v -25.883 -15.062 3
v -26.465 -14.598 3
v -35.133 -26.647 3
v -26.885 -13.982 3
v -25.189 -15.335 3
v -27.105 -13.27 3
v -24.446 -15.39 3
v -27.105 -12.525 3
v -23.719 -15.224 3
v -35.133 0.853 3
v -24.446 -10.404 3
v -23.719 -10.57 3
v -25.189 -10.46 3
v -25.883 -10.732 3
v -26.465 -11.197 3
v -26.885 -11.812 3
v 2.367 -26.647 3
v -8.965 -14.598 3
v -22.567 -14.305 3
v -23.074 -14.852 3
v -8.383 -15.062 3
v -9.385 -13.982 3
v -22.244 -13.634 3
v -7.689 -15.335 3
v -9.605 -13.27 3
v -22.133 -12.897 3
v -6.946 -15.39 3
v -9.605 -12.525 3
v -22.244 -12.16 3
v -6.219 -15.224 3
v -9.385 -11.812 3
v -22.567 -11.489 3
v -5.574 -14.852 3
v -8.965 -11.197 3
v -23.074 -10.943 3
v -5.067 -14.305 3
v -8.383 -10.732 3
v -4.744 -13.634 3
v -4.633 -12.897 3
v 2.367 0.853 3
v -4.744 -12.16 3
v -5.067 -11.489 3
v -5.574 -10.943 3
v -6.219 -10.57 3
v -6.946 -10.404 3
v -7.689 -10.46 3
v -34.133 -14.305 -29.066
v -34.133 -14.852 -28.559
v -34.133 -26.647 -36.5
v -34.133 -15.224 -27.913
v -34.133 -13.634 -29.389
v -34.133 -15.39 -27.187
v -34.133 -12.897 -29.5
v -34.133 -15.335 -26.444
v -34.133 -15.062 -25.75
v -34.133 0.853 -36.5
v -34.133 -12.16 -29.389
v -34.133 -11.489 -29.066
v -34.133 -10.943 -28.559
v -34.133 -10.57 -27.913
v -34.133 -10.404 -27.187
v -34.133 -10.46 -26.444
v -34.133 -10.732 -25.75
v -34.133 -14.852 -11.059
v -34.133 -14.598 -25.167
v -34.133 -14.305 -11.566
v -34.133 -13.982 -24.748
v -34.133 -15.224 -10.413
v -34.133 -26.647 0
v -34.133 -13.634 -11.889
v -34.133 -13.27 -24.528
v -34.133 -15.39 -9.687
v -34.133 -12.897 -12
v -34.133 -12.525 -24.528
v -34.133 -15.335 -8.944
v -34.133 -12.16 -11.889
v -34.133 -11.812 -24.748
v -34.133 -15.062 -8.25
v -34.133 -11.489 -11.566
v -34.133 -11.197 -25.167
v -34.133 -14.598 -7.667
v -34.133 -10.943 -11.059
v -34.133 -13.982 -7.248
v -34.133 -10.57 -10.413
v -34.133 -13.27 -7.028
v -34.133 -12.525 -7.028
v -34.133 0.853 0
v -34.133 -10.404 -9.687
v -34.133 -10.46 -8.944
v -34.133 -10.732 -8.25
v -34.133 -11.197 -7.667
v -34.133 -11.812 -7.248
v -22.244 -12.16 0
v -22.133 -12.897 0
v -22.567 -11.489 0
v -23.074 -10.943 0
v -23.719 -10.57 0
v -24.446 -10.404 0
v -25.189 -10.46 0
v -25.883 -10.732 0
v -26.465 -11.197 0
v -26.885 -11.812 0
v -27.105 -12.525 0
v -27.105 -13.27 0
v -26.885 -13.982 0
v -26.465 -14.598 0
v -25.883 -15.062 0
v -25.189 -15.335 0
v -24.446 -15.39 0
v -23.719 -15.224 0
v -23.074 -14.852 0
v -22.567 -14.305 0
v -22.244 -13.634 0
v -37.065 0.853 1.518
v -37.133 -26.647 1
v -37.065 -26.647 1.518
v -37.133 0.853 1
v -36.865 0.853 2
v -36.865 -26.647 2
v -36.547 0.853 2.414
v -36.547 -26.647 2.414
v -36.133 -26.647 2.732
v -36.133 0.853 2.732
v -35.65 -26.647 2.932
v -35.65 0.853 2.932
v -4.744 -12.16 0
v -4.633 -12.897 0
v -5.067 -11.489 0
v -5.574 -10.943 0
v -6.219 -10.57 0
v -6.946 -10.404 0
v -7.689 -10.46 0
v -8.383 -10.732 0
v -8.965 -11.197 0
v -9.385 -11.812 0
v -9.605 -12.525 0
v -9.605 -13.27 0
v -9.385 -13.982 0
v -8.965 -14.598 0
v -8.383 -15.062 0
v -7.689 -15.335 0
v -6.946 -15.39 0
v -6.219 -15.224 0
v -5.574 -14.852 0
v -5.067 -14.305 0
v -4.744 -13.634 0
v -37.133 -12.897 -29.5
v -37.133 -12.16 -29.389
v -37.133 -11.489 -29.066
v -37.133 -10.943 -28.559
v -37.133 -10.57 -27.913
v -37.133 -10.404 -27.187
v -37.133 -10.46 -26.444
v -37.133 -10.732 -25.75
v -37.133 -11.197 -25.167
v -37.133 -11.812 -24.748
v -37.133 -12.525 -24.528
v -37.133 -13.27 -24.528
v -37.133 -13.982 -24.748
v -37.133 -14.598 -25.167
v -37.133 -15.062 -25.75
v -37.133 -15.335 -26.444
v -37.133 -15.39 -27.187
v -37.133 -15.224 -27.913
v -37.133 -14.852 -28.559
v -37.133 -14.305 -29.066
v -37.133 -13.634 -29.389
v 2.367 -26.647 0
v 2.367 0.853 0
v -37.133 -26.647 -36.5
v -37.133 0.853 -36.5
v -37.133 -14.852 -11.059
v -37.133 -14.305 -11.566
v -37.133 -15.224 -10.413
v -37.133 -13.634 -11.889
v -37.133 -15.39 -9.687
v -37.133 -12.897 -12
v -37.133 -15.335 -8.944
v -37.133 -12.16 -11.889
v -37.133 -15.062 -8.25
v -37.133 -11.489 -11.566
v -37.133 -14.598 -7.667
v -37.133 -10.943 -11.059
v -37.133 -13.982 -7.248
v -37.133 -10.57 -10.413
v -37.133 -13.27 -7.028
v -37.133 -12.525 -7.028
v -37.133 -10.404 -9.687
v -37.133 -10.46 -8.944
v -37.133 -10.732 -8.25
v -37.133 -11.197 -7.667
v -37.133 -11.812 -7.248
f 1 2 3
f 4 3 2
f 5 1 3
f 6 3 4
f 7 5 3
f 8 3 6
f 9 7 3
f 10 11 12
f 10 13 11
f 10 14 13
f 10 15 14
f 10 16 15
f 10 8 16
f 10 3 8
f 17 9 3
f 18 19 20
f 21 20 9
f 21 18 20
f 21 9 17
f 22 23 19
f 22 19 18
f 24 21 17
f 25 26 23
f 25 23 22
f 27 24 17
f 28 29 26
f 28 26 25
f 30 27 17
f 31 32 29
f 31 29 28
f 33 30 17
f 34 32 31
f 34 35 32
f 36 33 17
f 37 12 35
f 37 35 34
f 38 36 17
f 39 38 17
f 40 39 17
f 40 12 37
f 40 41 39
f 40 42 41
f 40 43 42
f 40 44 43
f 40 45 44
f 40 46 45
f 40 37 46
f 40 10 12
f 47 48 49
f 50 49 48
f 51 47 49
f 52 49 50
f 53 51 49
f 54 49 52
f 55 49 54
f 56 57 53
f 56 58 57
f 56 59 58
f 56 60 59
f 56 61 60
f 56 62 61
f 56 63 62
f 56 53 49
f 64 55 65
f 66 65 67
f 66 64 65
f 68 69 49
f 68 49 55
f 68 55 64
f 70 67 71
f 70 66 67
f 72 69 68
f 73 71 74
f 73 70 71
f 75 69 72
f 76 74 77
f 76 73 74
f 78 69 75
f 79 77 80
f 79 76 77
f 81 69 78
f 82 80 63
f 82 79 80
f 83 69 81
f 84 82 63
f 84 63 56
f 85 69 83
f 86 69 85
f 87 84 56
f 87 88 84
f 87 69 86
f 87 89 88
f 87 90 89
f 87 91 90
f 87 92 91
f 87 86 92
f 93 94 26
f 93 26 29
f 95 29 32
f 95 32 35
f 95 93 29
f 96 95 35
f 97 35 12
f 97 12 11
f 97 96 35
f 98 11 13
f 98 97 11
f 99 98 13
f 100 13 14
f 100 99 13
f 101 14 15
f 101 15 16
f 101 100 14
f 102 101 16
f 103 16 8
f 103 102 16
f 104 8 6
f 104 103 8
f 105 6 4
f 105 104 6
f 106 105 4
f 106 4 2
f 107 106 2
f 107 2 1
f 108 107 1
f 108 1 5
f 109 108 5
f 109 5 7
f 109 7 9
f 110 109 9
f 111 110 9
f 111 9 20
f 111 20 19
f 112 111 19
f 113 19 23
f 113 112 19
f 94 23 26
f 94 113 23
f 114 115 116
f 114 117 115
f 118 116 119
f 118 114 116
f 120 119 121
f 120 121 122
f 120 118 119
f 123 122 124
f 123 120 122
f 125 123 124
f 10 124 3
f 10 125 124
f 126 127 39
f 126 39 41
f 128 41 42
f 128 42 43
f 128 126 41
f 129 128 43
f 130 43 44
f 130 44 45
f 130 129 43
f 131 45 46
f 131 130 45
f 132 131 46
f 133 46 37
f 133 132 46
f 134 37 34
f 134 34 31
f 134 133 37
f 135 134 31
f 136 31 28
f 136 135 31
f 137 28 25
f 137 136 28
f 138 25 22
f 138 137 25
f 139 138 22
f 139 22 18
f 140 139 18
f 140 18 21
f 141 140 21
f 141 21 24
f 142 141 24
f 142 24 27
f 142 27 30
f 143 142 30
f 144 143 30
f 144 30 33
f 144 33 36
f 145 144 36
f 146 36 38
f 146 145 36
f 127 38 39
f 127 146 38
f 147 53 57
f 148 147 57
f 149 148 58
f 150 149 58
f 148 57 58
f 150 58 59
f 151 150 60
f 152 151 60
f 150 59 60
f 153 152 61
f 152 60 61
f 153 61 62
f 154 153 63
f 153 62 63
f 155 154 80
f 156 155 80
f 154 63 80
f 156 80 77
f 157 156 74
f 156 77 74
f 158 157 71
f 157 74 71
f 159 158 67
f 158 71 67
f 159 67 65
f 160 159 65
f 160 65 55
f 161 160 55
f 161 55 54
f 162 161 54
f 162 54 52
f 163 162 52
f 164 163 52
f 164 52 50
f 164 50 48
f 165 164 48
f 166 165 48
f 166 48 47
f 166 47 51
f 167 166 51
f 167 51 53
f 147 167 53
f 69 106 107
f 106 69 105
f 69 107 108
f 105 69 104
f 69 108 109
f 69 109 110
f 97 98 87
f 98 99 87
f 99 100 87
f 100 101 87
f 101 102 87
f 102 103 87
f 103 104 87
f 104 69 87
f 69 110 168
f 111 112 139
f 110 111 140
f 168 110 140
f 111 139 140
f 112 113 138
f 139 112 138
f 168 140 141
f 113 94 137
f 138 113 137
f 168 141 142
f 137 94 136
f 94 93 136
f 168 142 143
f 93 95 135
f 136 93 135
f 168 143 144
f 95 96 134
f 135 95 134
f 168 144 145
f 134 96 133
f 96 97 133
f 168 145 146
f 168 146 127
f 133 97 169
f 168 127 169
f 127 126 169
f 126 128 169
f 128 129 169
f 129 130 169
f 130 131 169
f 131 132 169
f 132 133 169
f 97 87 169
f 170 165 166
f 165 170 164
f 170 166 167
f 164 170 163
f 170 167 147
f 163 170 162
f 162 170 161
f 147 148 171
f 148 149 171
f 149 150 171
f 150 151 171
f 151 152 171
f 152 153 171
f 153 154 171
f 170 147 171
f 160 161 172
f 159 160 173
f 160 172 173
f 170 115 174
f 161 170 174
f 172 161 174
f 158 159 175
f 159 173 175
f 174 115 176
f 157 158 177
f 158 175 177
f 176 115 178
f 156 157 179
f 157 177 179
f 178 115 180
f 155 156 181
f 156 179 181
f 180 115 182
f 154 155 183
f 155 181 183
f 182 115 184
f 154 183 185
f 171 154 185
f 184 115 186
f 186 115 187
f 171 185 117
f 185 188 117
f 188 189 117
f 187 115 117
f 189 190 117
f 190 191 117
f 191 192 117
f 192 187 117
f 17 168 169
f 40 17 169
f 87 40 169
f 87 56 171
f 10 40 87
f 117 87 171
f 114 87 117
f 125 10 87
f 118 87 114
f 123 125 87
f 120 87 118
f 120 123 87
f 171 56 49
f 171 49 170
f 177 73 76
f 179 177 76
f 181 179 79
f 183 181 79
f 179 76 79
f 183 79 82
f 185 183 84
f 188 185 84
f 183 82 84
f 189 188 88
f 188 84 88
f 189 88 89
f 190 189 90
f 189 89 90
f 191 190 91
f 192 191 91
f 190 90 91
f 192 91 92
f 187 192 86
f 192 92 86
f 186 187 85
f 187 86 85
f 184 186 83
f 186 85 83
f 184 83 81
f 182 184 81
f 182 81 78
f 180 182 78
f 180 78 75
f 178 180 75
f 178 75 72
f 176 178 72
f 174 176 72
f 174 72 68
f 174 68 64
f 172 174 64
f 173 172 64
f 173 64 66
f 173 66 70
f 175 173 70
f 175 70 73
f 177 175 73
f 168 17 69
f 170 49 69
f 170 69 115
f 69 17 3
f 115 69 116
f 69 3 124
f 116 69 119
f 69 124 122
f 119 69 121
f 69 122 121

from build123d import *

# Parameters (mm, degrees)
SKETCH1_W           = 39.5
SKETCH1_H           = 27.5
SKETCH1_R           = 2.5
BOSS_EXTRUDE1_DEPTH = 3
SKETCH3_W           = 3
SKETCH3_H           = 27.5
BOSS_EXTRUDE2_DEPTH = 36.5
SKETCH4_R           = 2.5
CUT_EXTRUDE1_DEPTH  = 36.5
FILLET1_R           = 2


with BuildPart() as part:
    # Sketch1 → Boss-Extrude1 (new body)
    with BuildSketch(Plane.XY):
        with Locations((-17.382808989, -12.897191011)):
            Rectangle(SKETCH1_W, SKETCH1_H)
        with Locations((-24.632808989, -12.897191011)):
            Circle(SKETCH1_R, mode=Mode.SUBTRACT)
        with Locations((-7.132808989, -12.897191011)):
            Circle(SKETCH1_R, mode=Mode.SUBTRACT)
    extrude(amount=BOSS_EXTRUDE1_DEPTH)

    # Sketch3 → Boss-Extrude2 (add)
    with BuildSketch(Plane(origin=(0, 0, 0), x_dir=(-1, 0, 0), z_dir=(0, 0, -1))):
        with Locations((35.632808989, -12.897191011)):
            Rectangle(SKETCH3_W, SKETCH3_H)
    extrude(amount=BOSS_EXTRUDE2_DEPTH)

    # Sketch4 → Cut-Extrude1 (cut)
    with BuildSketch(Plane(origin=(-34.132808989, 0, 0), x_dir=(0, 0, -1), z_dir=(1, 0, 0))):
        with Locations((9.5, -12.897191011)):
            Circle(SKETCH4_R)
        with Locations((27, -12.897191011)):
            Circle(SKETCH4_R)
    extrude(amount=-CUT_EXTRUDE1_DEPTH, mode=Mode.SUBTRACT)

    # Fillet1
    fillet1_edges = [part.edges().sort_by_distance(p)[0] for p in [
        (-37.132808989, -12.897191011, 3),
    ]]
    fillet(fillet1_edges, radius=FILLET1_R)


solid = part.part
